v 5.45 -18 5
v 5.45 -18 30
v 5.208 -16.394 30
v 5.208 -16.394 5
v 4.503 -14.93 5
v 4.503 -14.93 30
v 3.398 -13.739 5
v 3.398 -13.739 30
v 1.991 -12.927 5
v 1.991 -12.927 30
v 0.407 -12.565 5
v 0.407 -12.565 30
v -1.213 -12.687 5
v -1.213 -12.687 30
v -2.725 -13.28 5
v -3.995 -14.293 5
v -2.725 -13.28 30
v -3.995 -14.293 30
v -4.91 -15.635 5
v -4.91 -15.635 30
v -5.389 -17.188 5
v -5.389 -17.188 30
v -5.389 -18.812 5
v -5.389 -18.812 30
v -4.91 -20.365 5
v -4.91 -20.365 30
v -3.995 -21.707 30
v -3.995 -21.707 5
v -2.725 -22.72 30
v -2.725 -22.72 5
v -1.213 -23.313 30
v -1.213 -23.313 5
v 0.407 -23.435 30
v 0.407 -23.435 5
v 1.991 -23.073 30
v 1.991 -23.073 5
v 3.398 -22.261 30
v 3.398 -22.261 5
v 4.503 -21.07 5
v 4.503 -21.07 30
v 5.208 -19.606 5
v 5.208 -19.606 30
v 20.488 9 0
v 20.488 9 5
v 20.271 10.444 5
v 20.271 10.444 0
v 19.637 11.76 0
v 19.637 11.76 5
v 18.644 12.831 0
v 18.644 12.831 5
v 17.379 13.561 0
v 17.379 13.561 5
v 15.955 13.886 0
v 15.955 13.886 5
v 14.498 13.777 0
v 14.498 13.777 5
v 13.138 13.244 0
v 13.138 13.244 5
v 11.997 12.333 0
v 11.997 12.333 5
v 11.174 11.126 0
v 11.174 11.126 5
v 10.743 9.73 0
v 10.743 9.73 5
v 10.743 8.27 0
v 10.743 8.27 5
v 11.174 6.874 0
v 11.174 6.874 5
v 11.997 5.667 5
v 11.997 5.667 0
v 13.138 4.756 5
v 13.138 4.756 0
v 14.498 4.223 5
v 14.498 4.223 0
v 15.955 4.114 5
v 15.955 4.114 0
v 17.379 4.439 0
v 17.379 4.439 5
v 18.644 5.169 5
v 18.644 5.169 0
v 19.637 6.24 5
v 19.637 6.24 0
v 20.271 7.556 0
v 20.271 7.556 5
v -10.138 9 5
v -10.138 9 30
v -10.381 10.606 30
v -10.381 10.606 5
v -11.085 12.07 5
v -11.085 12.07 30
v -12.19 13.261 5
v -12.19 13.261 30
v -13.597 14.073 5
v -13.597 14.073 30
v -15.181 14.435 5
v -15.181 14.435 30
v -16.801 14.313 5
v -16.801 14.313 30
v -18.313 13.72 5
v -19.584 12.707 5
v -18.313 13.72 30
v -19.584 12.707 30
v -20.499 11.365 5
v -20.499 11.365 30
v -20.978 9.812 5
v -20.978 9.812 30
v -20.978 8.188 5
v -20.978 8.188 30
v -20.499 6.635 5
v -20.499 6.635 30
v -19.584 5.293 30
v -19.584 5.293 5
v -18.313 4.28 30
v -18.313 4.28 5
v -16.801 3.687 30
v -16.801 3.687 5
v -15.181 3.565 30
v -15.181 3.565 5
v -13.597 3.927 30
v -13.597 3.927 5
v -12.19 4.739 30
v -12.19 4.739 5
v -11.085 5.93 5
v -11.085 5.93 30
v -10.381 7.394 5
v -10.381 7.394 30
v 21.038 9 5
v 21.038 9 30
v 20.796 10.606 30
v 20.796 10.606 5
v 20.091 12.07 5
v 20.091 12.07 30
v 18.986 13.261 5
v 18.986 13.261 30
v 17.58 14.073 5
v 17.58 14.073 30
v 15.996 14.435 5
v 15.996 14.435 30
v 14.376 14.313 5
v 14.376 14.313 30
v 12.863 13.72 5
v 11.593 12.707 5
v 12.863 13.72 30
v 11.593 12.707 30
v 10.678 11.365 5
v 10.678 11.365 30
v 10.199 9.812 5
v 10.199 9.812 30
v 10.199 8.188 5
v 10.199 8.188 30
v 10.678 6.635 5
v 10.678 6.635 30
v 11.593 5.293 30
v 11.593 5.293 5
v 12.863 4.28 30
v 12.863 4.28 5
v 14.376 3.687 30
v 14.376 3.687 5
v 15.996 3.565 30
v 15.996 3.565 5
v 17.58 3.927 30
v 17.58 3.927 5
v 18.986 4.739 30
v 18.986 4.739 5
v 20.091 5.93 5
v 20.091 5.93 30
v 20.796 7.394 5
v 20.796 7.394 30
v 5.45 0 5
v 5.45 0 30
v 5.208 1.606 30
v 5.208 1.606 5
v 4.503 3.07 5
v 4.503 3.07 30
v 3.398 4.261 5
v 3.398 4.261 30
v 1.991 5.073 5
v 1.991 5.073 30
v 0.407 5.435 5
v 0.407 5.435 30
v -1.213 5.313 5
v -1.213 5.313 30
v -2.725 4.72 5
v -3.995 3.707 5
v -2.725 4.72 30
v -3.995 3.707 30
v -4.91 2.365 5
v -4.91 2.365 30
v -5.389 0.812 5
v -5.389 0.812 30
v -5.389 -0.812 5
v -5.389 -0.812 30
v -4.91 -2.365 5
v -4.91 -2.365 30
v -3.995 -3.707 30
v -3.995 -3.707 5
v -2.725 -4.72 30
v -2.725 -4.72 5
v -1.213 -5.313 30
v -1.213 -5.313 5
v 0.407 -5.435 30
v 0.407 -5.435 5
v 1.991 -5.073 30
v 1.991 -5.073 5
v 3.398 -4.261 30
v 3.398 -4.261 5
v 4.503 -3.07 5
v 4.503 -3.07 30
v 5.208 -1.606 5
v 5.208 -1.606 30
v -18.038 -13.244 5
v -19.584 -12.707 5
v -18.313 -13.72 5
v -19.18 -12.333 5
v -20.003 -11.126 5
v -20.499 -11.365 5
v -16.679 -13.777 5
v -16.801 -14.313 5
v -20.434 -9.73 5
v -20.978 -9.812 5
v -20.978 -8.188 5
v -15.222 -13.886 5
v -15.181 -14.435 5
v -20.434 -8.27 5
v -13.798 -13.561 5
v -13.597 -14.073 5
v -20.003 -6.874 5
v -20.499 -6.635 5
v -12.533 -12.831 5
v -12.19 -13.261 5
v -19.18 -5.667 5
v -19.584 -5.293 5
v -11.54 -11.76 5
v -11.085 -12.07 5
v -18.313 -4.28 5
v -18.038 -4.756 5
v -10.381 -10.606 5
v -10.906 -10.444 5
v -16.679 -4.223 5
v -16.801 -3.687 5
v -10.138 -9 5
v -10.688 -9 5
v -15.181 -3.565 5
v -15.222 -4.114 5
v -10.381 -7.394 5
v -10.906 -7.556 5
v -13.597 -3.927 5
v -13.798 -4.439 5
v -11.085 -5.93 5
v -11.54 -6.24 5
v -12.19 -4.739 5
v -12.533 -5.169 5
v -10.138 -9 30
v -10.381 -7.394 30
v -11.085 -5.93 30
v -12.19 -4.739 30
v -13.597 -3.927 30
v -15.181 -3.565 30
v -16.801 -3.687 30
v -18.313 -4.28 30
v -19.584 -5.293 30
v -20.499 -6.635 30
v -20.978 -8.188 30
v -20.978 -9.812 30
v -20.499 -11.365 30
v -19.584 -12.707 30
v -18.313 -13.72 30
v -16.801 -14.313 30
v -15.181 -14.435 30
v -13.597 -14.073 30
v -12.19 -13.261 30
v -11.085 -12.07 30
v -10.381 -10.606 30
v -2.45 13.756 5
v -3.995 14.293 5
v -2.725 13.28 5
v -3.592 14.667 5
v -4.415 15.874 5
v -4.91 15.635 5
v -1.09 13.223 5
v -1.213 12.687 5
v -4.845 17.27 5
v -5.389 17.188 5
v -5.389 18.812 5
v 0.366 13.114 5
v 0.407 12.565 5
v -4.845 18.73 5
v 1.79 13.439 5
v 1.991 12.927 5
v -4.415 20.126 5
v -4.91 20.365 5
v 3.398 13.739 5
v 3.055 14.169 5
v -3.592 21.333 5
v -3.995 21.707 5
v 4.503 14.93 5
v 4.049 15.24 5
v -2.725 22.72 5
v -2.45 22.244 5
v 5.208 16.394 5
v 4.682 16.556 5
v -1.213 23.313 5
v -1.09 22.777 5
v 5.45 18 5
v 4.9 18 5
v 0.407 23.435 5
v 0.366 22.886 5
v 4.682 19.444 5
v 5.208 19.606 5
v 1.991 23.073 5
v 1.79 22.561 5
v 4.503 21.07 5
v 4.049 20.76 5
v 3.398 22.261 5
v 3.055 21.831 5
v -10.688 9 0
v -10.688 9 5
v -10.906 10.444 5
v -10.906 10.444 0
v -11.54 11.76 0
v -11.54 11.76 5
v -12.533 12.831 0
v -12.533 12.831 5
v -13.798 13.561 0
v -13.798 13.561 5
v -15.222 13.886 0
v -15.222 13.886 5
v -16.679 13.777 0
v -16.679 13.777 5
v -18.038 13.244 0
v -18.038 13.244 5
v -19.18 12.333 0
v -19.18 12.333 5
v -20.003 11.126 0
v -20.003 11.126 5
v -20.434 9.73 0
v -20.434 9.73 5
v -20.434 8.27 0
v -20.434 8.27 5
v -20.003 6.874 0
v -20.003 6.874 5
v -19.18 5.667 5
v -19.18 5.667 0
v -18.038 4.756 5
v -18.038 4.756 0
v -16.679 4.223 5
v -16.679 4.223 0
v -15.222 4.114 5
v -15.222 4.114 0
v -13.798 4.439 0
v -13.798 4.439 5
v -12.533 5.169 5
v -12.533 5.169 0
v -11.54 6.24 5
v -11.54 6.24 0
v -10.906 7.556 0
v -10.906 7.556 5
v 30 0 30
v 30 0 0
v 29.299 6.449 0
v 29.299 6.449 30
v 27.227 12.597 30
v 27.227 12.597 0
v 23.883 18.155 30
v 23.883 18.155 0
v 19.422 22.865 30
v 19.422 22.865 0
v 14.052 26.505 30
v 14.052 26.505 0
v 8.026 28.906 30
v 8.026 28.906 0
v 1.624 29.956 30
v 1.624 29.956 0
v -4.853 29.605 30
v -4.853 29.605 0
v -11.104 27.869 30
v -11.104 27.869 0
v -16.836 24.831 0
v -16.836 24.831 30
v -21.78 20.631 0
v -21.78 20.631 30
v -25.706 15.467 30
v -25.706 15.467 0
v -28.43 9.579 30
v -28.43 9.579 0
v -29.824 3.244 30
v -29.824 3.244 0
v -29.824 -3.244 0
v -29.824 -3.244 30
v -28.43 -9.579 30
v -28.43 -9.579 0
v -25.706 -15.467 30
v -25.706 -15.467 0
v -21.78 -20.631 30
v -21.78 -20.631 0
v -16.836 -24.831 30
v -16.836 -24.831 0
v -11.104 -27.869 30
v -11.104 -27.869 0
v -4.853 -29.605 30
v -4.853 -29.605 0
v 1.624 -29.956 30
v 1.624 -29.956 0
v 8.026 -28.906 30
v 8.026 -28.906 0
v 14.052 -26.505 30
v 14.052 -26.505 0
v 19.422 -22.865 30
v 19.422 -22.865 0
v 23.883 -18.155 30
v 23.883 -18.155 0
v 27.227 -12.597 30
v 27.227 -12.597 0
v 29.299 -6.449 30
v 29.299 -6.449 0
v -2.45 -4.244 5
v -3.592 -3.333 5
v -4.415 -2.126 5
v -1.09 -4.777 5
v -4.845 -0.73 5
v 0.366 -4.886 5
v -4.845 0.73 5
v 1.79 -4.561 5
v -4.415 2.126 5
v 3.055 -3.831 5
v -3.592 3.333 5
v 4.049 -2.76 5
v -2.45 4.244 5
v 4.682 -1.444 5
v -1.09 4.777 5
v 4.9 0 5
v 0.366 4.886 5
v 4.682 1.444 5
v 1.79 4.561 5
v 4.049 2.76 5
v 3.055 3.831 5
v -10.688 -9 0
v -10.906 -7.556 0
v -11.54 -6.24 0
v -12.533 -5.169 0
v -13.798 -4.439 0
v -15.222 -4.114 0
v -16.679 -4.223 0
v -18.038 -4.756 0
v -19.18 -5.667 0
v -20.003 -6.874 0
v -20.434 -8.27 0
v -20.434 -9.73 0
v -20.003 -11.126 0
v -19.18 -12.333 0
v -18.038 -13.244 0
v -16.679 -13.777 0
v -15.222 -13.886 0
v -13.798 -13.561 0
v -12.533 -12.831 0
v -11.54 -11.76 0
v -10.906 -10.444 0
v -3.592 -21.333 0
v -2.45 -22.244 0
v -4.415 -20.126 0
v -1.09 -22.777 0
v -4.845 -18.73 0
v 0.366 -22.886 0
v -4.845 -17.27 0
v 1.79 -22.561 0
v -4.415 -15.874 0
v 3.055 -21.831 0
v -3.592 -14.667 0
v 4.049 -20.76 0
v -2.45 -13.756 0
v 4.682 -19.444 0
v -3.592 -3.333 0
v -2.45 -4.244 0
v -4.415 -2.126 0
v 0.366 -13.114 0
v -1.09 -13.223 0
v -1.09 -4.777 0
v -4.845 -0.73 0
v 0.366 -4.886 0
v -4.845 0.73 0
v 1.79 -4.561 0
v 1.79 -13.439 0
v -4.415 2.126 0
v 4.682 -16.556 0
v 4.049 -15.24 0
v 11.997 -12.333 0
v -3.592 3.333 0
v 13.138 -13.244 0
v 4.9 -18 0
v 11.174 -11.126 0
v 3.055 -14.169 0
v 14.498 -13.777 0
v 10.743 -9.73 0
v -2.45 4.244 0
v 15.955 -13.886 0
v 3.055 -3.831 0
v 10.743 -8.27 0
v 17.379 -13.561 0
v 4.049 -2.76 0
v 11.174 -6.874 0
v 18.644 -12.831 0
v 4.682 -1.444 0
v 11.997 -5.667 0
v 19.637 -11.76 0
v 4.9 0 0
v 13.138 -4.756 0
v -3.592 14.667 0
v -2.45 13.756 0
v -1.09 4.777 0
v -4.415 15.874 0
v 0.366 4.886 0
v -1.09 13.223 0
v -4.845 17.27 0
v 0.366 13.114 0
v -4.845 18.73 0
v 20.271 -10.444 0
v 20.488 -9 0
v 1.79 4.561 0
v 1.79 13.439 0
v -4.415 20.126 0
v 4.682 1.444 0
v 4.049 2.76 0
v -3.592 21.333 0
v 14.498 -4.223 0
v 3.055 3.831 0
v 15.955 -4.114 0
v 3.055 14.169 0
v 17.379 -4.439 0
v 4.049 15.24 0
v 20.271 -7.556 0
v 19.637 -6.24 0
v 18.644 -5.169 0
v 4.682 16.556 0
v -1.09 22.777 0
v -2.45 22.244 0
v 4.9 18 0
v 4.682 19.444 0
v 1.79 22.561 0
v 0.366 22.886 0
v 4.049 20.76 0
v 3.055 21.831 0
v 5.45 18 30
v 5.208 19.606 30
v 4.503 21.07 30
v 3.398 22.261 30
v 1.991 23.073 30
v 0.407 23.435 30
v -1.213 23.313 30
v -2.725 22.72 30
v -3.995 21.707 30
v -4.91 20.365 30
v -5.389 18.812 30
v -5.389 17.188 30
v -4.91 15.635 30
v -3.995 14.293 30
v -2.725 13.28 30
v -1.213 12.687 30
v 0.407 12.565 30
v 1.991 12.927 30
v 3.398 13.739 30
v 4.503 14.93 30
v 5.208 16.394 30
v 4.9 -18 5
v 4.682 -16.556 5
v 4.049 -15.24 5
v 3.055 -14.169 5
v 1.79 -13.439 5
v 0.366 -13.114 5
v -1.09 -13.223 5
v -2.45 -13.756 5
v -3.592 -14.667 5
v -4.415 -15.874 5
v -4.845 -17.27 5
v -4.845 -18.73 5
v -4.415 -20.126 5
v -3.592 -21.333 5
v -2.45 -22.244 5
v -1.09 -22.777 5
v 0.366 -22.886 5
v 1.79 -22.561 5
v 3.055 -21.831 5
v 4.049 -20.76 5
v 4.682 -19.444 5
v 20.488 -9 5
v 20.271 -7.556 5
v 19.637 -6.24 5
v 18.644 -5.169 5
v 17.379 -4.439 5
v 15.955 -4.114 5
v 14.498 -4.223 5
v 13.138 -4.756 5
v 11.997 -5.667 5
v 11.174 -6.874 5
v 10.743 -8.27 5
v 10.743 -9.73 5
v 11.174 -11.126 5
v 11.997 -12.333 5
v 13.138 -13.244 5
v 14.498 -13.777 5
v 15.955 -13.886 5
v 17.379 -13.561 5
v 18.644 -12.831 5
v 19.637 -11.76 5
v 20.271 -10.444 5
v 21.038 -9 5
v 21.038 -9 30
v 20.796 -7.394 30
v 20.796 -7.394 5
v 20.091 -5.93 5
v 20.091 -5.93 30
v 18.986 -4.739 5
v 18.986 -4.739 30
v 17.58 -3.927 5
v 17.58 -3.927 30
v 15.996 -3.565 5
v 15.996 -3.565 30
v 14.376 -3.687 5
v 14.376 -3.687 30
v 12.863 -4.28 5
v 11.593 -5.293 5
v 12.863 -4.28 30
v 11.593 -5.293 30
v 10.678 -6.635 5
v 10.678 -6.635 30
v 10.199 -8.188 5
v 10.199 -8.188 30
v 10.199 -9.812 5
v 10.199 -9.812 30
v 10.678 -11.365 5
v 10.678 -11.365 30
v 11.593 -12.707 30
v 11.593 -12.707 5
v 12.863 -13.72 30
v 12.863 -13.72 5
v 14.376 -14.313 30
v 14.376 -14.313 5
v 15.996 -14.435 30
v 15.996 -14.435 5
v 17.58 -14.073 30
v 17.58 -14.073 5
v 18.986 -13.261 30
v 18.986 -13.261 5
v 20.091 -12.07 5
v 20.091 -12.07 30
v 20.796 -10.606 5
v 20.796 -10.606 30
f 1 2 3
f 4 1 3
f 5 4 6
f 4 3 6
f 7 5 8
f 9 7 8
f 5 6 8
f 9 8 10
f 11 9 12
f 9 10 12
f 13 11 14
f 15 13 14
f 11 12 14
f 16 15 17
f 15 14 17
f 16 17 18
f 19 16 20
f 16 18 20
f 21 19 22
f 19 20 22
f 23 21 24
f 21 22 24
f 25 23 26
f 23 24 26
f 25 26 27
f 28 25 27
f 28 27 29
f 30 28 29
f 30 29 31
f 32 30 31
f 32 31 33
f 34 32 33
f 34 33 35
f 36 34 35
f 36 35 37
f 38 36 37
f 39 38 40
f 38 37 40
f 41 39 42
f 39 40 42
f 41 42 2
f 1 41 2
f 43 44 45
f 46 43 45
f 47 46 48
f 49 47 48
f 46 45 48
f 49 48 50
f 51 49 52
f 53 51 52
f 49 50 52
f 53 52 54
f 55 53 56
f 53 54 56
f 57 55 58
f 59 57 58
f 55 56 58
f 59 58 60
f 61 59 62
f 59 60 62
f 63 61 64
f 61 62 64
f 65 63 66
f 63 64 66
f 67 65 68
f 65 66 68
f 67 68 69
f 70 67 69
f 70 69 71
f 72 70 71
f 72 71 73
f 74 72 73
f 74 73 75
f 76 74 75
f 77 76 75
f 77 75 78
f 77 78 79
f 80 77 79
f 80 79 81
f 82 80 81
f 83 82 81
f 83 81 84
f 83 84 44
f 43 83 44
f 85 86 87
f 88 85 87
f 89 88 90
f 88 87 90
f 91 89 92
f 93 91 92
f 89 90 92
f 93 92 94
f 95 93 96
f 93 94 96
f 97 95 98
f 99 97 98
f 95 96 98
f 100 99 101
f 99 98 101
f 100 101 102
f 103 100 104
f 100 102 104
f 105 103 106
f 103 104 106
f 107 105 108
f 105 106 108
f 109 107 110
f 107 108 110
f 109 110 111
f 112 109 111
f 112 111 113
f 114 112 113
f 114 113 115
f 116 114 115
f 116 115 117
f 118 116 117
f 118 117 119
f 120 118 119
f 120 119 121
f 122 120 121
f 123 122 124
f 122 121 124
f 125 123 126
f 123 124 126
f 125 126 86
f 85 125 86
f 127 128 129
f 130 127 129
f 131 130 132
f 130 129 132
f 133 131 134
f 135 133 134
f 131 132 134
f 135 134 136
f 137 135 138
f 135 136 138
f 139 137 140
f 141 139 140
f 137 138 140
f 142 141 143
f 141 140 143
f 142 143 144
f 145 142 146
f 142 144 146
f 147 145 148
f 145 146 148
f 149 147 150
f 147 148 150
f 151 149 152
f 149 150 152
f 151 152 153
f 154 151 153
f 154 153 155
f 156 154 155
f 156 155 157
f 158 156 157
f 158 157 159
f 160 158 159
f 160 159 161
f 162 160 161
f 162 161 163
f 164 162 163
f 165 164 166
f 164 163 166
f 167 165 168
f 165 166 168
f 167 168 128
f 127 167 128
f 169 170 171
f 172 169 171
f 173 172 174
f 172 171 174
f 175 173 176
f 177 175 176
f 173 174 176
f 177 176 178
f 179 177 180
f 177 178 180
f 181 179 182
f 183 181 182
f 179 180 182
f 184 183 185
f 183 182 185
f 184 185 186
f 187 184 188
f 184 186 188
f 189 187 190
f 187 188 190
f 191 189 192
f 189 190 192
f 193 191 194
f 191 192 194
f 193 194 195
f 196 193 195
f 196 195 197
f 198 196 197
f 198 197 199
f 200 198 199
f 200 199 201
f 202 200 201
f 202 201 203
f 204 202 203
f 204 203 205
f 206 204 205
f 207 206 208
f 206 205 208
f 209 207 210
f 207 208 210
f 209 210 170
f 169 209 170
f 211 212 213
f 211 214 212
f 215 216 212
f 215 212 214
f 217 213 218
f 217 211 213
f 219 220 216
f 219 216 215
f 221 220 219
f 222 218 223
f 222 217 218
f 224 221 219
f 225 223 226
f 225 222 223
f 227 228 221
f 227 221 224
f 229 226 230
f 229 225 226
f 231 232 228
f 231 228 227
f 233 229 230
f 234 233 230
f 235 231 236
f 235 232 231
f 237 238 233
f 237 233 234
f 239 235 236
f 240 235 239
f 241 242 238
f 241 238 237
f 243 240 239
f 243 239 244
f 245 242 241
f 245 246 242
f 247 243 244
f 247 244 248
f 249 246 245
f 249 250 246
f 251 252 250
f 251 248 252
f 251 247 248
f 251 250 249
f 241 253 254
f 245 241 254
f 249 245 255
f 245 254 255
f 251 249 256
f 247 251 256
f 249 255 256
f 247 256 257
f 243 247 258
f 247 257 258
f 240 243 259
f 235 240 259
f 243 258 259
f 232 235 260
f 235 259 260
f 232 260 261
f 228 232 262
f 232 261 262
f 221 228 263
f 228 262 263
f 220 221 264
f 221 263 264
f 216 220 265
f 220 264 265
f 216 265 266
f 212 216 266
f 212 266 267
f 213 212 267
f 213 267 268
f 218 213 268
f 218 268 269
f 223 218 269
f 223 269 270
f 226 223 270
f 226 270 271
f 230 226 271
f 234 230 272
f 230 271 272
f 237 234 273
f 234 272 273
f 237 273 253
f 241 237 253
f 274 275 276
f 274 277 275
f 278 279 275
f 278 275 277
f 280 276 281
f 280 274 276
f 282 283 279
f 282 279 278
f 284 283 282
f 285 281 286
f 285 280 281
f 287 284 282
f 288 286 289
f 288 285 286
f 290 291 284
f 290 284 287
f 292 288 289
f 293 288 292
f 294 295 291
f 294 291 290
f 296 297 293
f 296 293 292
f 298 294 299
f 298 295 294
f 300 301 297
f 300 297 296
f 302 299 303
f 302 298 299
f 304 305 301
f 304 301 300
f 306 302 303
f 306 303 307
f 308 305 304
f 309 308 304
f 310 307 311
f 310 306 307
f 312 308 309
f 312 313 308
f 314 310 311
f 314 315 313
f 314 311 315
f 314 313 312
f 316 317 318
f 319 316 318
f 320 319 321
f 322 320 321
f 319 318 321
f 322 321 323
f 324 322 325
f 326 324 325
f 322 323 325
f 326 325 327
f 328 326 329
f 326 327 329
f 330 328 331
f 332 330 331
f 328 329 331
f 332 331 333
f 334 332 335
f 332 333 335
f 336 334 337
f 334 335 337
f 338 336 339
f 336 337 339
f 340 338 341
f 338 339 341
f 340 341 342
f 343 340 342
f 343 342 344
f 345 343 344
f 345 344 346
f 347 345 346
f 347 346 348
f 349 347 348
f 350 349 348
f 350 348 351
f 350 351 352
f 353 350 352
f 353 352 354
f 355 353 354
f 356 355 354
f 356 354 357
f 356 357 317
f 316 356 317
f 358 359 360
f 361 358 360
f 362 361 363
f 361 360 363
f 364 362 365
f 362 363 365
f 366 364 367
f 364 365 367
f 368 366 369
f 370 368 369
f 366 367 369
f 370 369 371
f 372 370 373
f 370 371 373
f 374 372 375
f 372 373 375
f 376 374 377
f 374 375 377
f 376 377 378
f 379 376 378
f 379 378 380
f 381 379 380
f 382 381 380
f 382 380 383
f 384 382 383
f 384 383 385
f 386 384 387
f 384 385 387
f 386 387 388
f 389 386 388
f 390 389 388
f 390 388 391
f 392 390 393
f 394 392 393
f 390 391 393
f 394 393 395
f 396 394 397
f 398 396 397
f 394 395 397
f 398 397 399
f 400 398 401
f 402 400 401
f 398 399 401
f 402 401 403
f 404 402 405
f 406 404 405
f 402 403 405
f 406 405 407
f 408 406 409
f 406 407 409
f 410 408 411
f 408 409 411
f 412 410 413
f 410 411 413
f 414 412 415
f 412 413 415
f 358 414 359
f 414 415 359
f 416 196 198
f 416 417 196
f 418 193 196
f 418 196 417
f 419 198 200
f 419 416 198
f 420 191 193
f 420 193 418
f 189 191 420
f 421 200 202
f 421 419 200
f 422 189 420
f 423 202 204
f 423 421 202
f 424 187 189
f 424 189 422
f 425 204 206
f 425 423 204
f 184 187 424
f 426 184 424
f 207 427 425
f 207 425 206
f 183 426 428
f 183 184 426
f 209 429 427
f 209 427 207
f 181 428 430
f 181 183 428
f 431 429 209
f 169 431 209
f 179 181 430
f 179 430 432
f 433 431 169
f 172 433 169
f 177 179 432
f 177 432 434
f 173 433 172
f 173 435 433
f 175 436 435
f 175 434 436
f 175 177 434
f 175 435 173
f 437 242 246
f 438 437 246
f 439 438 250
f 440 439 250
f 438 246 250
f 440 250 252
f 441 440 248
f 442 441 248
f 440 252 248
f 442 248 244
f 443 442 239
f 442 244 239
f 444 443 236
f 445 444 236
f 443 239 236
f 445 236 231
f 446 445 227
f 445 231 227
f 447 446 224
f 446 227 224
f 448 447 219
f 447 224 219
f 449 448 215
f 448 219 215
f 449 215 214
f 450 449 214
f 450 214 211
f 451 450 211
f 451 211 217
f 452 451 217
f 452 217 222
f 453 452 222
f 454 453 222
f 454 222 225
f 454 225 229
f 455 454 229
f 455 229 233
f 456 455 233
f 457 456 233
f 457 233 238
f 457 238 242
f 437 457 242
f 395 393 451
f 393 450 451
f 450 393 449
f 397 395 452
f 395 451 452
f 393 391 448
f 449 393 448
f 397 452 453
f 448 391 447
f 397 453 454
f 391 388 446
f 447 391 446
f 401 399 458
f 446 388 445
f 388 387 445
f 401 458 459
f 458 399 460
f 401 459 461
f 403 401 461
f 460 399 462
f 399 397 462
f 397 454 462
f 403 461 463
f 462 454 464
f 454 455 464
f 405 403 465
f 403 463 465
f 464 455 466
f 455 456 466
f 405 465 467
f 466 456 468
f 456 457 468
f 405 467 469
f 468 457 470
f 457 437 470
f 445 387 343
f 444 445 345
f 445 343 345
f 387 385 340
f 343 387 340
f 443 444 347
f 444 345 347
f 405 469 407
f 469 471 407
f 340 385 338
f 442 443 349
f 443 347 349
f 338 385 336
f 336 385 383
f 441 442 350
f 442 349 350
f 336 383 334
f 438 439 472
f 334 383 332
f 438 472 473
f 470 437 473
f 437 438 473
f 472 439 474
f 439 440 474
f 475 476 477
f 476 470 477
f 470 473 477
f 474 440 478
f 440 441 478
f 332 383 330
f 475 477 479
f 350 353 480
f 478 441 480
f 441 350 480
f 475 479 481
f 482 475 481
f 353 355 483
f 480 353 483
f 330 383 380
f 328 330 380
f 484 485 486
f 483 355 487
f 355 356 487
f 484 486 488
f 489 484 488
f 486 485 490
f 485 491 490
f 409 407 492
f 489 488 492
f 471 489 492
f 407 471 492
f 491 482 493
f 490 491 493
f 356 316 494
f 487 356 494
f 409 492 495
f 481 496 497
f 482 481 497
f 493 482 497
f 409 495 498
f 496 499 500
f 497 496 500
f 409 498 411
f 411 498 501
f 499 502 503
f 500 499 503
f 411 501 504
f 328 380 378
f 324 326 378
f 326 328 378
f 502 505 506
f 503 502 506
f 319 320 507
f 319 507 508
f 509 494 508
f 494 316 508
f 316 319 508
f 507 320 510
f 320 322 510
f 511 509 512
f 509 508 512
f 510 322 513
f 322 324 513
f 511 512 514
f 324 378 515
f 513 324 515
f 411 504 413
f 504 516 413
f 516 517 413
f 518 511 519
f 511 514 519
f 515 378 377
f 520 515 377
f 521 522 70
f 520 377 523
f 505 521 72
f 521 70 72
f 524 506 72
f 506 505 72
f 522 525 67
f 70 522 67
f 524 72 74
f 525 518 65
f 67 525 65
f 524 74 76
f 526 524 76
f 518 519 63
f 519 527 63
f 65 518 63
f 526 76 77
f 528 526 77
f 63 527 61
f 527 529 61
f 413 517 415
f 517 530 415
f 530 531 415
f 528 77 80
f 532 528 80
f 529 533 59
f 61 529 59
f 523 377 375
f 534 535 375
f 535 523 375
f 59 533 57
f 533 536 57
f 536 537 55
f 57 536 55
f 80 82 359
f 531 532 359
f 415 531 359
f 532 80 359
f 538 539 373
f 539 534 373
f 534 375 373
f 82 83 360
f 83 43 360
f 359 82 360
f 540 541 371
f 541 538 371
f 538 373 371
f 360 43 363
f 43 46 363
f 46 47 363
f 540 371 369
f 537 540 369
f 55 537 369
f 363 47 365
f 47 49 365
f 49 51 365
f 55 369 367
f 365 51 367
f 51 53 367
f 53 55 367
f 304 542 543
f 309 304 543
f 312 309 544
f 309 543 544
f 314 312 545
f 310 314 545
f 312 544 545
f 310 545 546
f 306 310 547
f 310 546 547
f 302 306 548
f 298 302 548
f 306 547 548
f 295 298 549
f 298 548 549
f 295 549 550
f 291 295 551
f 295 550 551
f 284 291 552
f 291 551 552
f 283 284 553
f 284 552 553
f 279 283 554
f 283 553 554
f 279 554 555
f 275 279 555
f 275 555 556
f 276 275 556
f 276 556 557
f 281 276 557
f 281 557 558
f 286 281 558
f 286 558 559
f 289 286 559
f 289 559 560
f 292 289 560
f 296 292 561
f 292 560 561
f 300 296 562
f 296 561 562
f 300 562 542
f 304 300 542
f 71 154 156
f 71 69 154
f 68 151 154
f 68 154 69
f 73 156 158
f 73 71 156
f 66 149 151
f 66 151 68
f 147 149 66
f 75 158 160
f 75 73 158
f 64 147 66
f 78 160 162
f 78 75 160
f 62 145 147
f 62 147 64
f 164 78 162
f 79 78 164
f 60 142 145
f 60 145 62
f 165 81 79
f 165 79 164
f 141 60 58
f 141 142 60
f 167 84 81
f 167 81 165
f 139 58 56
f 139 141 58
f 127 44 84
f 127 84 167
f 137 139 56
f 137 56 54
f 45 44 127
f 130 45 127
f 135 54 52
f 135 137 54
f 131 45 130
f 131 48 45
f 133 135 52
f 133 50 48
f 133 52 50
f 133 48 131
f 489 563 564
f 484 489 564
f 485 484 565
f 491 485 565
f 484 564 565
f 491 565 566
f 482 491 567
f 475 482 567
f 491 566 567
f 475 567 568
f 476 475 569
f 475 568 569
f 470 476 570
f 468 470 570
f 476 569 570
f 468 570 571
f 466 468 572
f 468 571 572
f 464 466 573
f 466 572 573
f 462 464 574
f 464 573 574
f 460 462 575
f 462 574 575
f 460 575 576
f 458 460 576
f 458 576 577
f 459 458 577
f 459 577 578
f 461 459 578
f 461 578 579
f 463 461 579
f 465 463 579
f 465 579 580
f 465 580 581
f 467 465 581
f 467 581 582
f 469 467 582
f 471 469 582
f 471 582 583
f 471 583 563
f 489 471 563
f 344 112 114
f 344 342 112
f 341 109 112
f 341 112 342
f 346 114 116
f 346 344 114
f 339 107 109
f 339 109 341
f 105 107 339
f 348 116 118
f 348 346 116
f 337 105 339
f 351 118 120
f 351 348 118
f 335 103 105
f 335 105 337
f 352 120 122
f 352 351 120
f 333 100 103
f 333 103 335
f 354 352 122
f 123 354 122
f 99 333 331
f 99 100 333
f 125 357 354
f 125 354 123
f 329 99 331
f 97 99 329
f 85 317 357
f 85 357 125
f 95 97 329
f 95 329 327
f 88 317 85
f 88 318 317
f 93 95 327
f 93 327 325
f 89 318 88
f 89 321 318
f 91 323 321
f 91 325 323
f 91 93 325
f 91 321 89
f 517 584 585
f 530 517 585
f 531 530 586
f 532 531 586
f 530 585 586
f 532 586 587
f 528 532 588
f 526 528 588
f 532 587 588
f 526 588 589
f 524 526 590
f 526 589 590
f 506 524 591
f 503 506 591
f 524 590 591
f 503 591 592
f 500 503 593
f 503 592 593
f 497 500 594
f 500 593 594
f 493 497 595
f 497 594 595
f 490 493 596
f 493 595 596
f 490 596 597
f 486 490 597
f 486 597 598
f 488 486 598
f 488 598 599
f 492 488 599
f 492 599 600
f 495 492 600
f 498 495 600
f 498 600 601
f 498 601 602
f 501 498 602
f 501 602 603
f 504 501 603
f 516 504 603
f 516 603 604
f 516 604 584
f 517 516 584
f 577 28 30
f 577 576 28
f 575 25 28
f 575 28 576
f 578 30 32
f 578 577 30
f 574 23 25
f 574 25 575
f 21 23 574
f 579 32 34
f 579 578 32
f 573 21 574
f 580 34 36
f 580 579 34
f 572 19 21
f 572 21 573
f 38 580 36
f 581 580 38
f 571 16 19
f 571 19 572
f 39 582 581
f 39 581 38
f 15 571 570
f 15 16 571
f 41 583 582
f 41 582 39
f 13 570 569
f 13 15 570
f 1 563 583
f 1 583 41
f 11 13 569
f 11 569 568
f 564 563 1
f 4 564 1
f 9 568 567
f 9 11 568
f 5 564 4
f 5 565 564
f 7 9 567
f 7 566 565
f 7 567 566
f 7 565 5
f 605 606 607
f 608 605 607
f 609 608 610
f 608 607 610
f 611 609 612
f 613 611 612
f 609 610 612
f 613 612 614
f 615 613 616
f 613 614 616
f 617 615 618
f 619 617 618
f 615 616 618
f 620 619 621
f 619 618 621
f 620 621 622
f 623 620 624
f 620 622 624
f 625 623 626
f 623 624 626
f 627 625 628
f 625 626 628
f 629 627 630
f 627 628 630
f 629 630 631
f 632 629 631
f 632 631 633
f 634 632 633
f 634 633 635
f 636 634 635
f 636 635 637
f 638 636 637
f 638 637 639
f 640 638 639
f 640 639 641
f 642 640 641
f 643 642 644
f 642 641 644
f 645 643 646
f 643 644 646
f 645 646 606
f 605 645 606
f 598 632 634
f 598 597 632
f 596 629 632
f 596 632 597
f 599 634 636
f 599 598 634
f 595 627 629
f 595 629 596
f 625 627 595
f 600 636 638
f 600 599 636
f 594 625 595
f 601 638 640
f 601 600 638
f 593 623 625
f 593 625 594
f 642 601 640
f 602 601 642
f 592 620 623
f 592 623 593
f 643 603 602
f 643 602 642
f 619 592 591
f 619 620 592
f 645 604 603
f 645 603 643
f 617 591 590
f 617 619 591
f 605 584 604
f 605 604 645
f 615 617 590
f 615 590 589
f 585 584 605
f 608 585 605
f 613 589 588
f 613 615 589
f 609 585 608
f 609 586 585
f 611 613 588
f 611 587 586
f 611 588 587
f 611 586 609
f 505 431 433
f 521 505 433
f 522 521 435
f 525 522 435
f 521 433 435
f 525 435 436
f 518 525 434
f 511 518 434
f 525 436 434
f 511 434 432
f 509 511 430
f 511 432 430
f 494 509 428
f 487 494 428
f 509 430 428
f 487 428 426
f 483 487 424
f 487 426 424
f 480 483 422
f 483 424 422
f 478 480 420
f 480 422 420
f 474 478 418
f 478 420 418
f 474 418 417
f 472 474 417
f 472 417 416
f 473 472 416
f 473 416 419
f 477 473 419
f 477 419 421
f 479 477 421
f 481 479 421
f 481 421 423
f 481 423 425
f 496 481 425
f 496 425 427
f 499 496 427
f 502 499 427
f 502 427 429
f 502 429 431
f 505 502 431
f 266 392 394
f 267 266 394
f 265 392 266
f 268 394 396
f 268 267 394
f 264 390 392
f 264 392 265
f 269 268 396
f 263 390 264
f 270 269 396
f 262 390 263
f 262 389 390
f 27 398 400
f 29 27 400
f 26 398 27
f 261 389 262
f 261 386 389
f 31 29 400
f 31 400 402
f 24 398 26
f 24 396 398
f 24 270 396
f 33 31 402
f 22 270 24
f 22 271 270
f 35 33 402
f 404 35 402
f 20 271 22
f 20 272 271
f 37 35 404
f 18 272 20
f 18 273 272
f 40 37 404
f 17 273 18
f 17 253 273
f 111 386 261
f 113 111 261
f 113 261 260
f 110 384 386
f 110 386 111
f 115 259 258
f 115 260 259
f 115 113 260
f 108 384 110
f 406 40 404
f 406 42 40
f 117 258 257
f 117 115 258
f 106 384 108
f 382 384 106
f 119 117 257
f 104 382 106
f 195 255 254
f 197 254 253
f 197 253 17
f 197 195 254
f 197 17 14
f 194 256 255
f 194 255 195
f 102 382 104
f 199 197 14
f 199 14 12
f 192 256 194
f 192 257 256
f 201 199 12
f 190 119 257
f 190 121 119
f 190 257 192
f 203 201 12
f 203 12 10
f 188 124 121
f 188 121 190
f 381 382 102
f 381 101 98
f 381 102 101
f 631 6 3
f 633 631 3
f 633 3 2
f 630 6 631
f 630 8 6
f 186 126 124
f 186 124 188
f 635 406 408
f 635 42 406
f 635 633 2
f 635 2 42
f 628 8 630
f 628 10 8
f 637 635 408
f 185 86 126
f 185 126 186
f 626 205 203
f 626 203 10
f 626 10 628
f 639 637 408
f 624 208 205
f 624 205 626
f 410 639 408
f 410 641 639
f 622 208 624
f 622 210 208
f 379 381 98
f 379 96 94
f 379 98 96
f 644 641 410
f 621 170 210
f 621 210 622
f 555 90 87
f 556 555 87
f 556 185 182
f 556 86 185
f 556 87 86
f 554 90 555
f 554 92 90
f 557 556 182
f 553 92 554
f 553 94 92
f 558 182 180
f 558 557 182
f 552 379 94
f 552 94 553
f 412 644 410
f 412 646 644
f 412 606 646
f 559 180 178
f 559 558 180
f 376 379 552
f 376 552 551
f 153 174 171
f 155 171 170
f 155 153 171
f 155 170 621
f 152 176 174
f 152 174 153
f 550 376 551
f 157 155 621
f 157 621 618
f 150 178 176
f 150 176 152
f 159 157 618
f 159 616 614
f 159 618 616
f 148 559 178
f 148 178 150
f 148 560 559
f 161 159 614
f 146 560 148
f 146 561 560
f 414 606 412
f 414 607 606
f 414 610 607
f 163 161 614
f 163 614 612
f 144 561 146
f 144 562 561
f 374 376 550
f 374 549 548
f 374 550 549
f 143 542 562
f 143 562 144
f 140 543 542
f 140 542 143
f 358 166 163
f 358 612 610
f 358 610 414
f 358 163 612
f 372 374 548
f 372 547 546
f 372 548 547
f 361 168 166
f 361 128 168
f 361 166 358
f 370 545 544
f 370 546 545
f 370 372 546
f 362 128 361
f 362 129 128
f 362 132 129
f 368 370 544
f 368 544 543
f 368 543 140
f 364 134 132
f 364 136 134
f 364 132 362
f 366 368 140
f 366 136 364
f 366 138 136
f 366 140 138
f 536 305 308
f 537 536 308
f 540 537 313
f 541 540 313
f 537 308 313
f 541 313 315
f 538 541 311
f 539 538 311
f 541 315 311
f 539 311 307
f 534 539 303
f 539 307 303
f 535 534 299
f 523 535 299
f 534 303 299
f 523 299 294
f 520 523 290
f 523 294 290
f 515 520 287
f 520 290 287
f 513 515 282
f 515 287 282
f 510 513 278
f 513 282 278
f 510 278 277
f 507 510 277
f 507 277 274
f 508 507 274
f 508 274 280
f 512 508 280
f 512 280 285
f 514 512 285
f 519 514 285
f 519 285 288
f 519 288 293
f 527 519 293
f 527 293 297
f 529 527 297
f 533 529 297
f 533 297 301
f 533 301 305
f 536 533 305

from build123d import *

# Parameters (mm, degrees)
F0_R     = 30
F1_DEPTH = 30
F2_R     = 4.9
F3_DEPTH = 30
F4_R     = 5.45
F5_DEPTH = 25


with BuildPart() as f1:
    # F0 (on Top) → F1 (new body)
    with BuildSketch(Plane.XY):
        Circle(F0_R)
    extrude(amount=F1_DEPTH)

    # F2 (on face) → F3 (cut, through all)
    with BuildSketch(Plane.XY.offset(30)):
        Circle(F2_R)
        with Locations((0, 18)):
            Circle(F2_R)
        with Locations((-15.588457, 9)):
            Circle(F2_R)
        with Locations((-15.588457, -9)):
            Circle(F2_R)
        with Locations((0, -18)):
            Circle(F2_R)
        with Locations((15.588457, -9)):
            Circle(F2_R)
        with Locations((15.588457, 9)):
            Circle(F2_R)
    extrude(amount=-F3_DEPTH, mode=Mode.SUBTRACT)

    # F4 (on face) → F5 (cut)
    with BuildSketch(Plane.XY.offset(30)):
        Circle(F4_R)
        with Locations((0, 18)):
            Circle(F4_R)
        with Locations((-15.588457, 9)):
            Circle(F4_R)
        with Locations((-15.588457, -9)):
            Circle(F4_R)
        with Locations((0, -18)):
            Circle(F4_R)
        with Locations((15.588457, -9)):
            Circle(F4_R)
        with Locations((15.588457, 9)):
            Circle(F4_R)
    extrude(amount=-F5_DEPTH, mode=Mode.SUBTRACT)


solid = f1.part
